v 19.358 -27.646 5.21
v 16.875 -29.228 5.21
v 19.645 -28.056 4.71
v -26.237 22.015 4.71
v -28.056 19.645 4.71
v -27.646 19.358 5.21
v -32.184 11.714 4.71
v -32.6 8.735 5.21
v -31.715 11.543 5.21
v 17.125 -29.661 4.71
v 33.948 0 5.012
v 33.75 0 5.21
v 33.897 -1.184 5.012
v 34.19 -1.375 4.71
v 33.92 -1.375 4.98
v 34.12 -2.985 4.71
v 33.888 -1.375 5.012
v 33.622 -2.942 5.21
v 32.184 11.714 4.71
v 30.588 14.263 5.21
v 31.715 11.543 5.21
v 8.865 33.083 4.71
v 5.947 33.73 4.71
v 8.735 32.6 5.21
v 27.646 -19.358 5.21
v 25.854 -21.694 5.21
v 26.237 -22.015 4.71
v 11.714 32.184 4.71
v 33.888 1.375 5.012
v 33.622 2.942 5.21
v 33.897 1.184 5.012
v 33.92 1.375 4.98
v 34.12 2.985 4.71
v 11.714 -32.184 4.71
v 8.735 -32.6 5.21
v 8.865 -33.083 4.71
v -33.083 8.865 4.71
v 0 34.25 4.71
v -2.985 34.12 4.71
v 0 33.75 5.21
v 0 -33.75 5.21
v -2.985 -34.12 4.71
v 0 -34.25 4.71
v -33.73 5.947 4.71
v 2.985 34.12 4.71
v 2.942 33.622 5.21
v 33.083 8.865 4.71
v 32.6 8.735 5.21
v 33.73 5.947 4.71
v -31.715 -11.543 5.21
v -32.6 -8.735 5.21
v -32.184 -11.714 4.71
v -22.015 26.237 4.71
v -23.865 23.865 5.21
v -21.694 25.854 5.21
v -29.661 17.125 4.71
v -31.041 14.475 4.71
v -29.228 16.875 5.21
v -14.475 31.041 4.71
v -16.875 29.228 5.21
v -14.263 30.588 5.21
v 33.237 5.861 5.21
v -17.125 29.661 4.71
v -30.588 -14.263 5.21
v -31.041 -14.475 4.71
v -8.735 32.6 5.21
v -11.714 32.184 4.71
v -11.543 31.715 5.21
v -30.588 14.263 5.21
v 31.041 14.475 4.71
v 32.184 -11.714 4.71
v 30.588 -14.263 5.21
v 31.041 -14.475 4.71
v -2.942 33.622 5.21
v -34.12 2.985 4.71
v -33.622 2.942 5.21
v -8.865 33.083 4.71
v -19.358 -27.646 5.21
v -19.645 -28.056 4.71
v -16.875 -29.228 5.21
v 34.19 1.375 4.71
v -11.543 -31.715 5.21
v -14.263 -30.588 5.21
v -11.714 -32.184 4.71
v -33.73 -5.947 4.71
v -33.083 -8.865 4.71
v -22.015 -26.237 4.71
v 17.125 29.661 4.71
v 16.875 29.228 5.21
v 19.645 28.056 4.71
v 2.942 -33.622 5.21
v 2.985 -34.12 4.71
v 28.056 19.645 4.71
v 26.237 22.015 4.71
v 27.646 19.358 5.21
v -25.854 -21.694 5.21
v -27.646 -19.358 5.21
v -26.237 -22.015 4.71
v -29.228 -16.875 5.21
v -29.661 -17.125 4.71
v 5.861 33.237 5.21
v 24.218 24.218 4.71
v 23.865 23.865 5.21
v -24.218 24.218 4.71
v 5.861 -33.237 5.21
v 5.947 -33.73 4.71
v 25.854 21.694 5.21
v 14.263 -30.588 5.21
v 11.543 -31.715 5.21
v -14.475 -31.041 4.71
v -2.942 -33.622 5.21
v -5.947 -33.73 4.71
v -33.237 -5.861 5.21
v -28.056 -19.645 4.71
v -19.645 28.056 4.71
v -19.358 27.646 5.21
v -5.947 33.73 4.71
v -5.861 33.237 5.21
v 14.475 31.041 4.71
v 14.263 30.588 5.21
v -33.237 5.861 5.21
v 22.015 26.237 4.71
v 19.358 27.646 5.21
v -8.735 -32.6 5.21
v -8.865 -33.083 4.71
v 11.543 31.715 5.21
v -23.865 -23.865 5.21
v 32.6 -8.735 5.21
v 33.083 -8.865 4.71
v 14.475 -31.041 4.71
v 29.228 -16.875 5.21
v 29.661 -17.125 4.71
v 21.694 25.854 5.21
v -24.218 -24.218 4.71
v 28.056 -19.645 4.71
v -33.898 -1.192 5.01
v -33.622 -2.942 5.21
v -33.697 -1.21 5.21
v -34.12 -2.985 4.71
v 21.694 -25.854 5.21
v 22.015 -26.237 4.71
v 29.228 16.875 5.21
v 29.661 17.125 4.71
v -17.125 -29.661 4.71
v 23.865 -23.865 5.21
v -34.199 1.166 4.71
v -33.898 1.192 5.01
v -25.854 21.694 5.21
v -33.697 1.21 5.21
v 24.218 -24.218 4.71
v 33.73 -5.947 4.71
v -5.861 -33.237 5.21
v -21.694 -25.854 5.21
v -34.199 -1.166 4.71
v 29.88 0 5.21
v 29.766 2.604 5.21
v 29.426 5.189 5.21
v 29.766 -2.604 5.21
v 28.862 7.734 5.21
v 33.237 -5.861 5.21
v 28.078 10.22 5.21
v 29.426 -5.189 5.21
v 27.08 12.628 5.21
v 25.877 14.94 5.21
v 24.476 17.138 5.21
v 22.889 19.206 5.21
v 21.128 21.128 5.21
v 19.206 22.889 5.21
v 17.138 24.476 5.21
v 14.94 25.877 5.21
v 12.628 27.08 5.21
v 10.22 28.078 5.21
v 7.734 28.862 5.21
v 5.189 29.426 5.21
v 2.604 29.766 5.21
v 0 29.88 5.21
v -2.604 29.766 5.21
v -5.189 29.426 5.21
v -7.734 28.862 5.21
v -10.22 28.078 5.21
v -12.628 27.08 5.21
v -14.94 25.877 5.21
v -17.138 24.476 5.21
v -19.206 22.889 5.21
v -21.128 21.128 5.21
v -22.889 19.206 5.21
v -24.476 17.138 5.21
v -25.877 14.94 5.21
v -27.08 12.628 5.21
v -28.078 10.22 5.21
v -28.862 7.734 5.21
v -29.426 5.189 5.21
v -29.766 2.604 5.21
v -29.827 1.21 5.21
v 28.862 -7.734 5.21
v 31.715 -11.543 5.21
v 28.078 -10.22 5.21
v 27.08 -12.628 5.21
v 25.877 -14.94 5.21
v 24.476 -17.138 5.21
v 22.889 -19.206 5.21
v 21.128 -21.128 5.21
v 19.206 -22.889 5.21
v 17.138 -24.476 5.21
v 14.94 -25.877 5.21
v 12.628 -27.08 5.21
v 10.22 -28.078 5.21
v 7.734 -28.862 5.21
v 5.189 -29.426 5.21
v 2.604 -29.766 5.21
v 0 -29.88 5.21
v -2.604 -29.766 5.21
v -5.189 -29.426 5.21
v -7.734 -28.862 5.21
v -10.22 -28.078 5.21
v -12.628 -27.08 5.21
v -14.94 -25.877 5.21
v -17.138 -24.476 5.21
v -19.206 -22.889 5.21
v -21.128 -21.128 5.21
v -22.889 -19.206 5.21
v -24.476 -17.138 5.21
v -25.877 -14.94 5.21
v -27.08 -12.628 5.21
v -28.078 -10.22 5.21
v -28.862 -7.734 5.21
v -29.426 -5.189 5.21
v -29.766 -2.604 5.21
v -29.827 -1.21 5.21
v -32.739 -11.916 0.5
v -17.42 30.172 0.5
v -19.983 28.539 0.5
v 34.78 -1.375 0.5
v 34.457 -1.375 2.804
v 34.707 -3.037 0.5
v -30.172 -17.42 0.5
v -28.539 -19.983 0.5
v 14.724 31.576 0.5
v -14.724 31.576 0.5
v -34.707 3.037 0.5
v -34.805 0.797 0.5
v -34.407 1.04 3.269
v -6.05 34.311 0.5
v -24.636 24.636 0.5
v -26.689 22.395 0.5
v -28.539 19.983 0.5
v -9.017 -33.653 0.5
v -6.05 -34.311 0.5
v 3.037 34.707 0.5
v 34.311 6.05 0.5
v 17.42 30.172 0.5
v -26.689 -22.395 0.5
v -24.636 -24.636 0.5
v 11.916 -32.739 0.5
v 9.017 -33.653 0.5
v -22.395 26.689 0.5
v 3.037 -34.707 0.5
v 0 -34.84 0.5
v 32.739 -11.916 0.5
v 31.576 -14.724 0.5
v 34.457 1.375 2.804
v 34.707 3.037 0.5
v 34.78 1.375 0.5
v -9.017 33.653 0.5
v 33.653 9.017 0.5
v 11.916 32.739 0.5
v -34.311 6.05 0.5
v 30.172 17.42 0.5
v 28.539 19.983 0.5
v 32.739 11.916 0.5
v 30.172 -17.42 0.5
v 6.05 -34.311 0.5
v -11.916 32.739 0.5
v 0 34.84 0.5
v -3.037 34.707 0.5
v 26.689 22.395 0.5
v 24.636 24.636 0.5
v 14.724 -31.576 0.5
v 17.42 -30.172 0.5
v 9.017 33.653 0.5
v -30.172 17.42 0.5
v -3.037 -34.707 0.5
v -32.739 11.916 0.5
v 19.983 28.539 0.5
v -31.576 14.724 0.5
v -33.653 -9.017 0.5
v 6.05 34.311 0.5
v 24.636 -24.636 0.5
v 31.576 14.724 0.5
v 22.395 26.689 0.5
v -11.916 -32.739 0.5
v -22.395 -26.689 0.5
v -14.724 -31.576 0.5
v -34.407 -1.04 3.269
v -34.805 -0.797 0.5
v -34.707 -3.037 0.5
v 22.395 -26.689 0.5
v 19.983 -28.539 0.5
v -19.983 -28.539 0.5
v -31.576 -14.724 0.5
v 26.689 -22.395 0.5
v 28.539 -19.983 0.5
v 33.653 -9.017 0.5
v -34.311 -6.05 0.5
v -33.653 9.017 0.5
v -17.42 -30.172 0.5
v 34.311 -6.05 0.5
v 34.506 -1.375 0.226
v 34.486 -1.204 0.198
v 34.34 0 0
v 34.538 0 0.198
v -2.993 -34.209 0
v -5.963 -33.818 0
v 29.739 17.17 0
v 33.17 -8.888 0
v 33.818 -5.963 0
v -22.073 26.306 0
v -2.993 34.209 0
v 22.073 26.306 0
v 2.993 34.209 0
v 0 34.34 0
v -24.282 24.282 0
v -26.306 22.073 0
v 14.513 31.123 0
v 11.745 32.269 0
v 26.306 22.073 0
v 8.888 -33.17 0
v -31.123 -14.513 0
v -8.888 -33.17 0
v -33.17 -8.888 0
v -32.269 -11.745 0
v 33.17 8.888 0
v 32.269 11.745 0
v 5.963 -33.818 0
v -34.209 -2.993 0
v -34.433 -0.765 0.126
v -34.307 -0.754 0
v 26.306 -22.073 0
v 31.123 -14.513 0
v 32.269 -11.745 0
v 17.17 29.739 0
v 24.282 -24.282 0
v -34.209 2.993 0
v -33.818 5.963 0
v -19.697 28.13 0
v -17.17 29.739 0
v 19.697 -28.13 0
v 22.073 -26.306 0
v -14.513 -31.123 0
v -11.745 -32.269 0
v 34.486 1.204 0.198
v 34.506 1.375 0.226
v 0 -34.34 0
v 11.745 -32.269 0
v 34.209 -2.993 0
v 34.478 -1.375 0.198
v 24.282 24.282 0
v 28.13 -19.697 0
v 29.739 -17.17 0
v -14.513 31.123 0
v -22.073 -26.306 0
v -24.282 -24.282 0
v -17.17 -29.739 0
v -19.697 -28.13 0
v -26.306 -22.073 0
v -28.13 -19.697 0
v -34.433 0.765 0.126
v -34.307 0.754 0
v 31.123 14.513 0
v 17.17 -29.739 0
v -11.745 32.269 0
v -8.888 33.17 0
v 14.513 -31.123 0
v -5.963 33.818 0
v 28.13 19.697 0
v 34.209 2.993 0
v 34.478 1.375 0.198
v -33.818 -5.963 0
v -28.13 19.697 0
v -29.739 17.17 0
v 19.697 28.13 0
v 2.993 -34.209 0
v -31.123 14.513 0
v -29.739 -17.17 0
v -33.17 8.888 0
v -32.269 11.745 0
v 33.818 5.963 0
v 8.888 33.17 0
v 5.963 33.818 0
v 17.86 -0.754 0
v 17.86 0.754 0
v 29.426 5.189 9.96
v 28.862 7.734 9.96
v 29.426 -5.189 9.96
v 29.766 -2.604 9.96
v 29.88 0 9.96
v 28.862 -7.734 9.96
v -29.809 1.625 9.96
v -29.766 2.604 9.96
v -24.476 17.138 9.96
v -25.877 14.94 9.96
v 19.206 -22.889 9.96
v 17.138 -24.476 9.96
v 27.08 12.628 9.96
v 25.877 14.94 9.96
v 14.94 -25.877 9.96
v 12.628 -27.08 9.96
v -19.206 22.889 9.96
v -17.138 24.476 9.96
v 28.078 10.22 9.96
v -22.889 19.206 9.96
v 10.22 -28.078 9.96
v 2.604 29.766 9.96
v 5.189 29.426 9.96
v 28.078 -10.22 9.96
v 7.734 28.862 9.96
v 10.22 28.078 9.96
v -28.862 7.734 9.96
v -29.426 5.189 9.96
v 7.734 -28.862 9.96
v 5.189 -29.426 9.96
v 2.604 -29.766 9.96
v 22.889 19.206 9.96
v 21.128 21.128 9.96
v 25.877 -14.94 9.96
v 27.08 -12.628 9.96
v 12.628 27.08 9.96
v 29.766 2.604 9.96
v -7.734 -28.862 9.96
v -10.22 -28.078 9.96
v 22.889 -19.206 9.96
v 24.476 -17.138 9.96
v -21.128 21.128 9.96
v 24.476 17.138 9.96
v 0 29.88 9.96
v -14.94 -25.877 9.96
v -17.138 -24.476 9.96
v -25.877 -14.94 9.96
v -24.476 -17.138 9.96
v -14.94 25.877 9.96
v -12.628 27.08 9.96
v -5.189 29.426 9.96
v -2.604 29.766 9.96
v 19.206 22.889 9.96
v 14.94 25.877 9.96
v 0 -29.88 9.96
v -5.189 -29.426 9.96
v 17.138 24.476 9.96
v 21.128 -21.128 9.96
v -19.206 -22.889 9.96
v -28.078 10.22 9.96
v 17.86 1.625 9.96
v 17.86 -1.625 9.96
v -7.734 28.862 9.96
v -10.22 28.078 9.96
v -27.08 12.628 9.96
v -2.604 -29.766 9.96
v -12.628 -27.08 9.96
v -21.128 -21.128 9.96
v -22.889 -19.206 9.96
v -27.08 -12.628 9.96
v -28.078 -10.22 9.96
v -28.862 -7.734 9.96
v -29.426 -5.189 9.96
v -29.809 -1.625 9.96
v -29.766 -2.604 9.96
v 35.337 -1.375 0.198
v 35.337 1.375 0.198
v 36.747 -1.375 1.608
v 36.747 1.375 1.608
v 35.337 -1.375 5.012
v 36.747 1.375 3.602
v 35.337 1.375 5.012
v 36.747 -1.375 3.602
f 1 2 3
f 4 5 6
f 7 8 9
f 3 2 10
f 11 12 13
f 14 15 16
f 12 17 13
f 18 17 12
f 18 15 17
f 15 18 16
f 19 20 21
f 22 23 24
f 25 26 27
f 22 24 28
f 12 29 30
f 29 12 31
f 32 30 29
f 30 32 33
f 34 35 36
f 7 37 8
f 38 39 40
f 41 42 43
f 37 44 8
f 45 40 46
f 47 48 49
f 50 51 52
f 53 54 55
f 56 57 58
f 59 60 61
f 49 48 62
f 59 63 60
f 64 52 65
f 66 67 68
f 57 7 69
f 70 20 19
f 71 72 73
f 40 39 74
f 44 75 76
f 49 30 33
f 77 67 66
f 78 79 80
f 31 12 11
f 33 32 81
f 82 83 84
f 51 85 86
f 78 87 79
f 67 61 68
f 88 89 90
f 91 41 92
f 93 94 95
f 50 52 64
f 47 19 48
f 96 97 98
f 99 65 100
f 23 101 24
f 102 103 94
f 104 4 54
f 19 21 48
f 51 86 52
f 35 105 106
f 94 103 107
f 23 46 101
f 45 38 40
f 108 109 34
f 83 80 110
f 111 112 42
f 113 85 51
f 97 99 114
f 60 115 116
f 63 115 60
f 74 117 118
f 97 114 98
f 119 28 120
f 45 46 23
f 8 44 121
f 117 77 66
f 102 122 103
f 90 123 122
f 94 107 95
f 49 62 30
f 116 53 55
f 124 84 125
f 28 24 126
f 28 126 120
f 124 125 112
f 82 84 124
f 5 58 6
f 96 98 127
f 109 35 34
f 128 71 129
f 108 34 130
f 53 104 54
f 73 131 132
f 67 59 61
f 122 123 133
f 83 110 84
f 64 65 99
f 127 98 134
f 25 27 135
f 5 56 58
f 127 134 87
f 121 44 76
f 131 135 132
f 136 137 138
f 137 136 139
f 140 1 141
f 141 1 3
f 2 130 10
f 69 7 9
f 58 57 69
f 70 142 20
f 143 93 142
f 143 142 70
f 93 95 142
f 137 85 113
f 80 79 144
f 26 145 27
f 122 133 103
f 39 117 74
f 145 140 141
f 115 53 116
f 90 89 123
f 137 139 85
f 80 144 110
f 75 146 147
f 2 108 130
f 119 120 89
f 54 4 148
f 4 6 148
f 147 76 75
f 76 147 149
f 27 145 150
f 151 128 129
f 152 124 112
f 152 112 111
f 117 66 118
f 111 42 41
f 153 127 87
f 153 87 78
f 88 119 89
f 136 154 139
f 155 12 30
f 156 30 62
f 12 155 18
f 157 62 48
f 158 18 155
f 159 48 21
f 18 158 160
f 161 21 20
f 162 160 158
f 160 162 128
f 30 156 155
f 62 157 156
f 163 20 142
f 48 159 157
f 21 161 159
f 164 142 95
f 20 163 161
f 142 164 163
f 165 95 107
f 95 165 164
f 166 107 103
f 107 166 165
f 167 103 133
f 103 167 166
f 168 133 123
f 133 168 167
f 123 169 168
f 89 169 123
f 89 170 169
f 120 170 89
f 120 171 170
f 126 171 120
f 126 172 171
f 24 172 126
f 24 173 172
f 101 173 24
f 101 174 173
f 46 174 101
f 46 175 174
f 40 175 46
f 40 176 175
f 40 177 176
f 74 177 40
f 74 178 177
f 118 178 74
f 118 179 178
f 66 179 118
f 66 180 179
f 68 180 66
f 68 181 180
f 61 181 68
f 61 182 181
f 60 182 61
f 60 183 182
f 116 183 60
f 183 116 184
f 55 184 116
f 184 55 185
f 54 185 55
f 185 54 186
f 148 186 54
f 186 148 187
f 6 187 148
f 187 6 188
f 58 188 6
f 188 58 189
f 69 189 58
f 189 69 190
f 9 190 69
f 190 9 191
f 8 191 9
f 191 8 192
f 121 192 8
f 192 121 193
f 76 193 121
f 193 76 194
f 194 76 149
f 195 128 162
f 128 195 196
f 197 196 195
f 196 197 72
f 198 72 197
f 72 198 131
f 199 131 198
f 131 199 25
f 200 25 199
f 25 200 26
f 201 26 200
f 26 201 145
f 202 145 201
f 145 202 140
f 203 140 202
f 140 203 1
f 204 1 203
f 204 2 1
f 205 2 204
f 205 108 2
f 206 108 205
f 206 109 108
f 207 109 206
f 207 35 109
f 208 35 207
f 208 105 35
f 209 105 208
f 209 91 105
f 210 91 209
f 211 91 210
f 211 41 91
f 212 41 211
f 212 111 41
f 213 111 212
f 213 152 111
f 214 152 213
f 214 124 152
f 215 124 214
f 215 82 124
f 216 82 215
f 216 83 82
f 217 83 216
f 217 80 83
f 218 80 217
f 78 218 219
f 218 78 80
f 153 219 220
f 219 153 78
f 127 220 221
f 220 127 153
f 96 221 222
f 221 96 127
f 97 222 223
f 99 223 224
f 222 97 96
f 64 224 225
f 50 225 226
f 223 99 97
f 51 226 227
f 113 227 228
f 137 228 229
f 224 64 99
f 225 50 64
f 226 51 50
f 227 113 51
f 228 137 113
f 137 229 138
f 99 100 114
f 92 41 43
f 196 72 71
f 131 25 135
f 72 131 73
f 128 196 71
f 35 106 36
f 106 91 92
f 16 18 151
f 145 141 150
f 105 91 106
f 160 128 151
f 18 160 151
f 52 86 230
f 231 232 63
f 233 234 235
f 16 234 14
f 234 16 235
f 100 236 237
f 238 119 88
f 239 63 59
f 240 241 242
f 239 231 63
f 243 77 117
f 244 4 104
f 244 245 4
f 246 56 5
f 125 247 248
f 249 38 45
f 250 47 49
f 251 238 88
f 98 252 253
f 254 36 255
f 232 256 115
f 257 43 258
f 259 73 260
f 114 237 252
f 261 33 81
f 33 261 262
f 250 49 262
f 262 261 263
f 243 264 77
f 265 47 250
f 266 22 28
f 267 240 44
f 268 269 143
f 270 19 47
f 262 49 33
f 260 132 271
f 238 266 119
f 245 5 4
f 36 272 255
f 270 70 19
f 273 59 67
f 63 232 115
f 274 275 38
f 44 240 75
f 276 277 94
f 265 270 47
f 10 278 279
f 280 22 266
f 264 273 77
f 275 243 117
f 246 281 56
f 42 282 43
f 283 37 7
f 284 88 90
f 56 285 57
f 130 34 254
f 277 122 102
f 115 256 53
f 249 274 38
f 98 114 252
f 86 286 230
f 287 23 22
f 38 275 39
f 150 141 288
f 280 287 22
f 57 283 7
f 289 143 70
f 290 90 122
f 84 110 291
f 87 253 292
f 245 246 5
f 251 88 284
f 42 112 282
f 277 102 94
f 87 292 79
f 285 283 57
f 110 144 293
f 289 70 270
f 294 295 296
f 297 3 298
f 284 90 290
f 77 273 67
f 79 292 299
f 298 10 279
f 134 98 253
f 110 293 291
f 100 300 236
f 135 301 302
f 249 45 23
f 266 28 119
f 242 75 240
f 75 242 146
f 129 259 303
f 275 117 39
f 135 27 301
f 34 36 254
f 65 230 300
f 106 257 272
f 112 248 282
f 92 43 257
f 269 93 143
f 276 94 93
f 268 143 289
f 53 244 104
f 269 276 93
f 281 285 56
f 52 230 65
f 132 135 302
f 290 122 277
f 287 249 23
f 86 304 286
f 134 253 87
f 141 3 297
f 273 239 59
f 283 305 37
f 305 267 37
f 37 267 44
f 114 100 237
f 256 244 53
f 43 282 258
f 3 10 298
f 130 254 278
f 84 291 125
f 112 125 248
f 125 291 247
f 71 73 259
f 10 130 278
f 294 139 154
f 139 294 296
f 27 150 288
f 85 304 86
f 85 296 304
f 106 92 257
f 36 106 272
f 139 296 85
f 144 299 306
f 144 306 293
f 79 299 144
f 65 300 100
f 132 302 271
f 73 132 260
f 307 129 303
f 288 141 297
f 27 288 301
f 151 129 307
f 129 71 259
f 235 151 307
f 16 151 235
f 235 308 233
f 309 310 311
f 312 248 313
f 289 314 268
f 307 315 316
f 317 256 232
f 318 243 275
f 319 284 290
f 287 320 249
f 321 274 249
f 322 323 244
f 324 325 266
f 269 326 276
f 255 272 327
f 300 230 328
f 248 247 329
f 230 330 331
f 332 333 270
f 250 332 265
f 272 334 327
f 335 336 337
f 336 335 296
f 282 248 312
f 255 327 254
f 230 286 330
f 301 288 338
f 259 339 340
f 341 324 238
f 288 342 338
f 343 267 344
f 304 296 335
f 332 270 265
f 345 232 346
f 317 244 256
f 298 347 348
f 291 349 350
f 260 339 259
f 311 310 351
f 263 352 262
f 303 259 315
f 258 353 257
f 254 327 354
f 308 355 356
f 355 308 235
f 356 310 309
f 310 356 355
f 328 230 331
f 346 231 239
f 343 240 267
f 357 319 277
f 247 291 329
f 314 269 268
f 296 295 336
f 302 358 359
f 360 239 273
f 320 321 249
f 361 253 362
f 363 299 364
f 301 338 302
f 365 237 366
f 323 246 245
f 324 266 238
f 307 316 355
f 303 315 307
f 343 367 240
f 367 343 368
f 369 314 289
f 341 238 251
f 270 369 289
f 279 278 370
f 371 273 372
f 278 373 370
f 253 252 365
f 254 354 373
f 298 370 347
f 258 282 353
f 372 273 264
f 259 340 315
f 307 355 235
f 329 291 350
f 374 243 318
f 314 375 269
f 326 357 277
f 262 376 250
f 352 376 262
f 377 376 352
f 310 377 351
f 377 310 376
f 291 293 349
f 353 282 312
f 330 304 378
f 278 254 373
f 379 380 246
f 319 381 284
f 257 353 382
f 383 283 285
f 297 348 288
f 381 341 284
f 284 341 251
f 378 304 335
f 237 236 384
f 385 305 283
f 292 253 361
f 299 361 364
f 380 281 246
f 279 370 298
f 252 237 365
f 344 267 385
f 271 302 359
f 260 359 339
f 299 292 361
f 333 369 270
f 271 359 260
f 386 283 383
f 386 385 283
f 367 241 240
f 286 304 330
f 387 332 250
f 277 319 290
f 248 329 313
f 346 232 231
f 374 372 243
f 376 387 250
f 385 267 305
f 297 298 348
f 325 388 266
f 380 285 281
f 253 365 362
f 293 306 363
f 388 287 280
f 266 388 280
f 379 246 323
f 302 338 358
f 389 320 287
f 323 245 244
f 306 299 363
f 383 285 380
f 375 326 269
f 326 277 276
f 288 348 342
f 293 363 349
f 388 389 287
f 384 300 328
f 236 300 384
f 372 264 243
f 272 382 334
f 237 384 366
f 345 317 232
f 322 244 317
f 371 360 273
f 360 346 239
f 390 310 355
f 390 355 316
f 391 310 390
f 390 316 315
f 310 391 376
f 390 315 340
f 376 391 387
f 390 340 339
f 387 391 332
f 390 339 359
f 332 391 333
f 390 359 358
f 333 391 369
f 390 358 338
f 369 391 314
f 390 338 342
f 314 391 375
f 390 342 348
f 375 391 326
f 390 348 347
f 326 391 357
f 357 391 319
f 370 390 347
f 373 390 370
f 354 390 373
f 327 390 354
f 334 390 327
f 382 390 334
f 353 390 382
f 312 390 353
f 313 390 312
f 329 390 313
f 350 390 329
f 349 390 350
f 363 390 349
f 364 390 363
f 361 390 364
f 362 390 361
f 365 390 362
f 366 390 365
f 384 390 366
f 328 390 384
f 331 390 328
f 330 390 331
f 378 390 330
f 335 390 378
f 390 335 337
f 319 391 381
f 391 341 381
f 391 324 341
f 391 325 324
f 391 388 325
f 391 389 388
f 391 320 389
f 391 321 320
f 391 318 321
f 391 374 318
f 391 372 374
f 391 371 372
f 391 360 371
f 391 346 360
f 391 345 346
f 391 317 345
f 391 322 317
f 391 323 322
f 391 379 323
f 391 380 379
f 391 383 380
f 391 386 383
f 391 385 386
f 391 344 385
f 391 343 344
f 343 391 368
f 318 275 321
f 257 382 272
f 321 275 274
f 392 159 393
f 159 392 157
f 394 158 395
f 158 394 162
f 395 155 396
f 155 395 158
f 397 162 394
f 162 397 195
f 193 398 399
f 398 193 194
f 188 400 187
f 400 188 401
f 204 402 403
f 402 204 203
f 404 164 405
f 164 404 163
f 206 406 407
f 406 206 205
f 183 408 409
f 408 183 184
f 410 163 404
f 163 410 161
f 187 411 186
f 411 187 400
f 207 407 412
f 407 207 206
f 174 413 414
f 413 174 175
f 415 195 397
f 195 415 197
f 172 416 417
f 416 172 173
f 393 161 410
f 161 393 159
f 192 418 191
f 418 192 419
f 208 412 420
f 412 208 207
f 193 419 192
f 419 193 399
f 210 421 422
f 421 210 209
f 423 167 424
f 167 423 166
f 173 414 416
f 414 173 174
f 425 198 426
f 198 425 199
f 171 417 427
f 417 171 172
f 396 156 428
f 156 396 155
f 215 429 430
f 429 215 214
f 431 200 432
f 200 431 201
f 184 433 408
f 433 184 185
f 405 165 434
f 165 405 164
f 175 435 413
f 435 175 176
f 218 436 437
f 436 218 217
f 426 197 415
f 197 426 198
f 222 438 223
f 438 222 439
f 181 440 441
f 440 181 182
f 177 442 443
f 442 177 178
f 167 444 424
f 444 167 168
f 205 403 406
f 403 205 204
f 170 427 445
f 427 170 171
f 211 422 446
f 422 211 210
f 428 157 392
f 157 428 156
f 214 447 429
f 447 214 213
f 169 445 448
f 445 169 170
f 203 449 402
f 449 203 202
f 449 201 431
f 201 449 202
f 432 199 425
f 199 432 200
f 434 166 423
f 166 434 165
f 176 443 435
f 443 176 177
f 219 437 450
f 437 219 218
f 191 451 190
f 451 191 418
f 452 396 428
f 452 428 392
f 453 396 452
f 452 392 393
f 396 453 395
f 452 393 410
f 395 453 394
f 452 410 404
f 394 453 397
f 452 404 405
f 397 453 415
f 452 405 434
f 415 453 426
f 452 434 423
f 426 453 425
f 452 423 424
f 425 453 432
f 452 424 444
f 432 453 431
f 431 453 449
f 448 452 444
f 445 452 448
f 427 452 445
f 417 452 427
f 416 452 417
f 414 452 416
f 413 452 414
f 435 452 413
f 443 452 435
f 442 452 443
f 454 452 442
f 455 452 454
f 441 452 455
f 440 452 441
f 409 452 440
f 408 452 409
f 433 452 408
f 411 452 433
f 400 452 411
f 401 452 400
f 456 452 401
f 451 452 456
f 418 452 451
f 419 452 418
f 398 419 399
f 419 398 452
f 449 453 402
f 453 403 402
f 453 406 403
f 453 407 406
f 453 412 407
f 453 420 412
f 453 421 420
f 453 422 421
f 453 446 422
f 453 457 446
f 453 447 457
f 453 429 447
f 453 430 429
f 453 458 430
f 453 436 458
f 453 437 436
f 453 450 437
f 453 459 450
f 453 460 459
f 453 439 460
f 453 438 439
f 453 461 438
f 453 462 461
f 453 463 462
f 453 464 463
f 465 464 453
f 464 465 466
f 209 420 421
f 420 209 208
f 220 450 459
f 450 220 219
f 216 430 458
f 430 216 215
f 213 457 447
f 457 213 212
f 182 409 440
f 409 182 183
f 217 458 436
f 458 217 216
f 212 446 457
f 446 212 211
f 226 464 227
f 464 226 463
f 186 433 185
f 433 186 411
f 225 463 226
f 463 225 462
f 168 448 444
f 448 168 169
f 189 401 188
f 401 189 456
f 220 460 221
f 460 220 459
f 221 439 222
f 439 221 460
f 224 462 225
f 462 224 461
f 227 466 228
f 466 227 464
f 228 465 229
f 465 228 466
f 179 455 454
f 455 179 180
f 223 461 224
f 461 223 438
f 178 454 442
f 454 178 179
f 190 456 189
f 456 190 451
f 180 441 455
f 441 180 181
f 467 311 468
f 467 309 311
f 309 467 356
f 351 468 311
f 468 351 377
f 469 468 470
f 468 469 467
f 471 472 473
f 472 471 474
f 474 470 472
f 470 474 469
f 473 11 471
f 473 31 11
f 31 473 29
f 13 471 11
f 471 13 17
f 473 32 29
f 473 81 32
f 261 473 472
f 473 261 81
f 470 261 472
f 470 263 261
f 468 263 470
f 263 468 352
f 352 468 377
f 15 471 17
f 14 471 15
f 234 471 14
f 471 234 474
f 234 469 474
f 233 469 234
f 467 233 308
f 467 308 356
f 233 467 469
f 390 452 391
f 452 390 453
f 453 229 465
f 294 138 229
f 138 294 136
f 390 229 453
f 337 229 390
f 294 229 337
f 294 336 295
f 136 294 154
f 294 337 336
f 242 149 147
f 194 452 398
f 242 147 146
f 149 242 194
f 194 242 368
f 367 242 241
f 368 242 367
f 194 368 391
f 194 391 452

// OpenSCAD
// A tool for creating custom saw inserts
//
// Lisenced under creative commons, attribution, share-alike
// For the attribution requirement, please provide a link to:
//	http://www.thingiverse.com/thing:1024418

// the units that all of the measurements below will be in
units=0; // [0:mm,1:inch]

// how big around the top of the insert is
top_d=69.68;

// how big around the top of the insert is (if zero, uses top_d)
bottom_d=68.5;

// size of a chamfer for the top (can be zero)
top_chamfer=0.5;

// size of a chamfer for the bottom (can be zero)
bottom_chamfer=0.5;

// the width of the blade slot (can be zero for no kerf)
kerf_width=1.5;

// how long to make the slot for the blade (can be zero for no kerf)
kerf_len=52.7;

// EXPERIMENTAL: tilt the kerf on each side so that dust falls out easier
kerf_crud_drainage=1; //[0:off,1:try it]

// how thick the insert is
thickness=5.21;

// how wide to make a key (fits into blade installation slot to keep insert from turning)  Can be zero.
key_width=2.75;

// What angle you want the key to be at
key_orientation=0; //[0,45,90,135,180,225,270,315]

// Add sub-support to drop even deeper (zero = no sub support)
sub_dia=59.76;

// Add sub-support to drop even deeper (zero = no sub support)
sub_thickness=4.75;

// flip upside-down for easier printing
print_orientation=1; // [0:view,1:print]

/* [hidden] */

units_table=[1,25.4];

function tomm(x)=x*units_table[units];

module doTheThing(){
	top_d=tomm(top_d);
	bottom_d=bottom_d<=0?top_d:tomm(bottom_d);
	top_chamfer=top_chamfer<=0?0.001:tomm(top_chamfer);
	bottom_chamfer=bottom_chamfer<=0?0.001:tomm(bottom_chamfer);
	kerf_width=tomm(kerf_width);
	kerf_len=tomm(kerf_len);
	thickness=tomm(thickness);
	key_width=tomm(key_width);
	sub_dia=tomm(sub_dia);
	sub_thickness=sub_dia<=0?0:tomm(sub_thickness);
	cd_angle=10;
	translate([0,0,print_orientation==1?thickness+sub_thickness:0]) rotate([print_orientation==1?180:0,0,0]) difference(){
		union(){
			// blank
			translate([0,0,sub_thickness]) cylinder(r1=bottom_d/2-bottom_chamfer,r2=bottom_d/2,h=bottom_chamfer,$fn=72);
			translate([0,0,sub_thickness+bottom_chamfer]) cylinder(r1=bottom_d/2,r2=top_d/2,h=thickness-bottom_chamfer-top_chamfer,$fn=72);
			translate([0,0,sub_thickness+thickness-bottom_chamfer]) cylinder(r1=top_d/2,r2=top_d/2-top_chamfer,h=top_chamfer,$fn=72);
			if(sub_thickness>0){
				cylinder(r=sub_dia/2,h=sub_thickness,$fn=72);
			}
			//key
			if(key_width>0){
				rotate([0,0,key_orientation]) translate([top_d/2-top_chamfer,key_width/2,thickness/2+sub_thickness]) rotate([90,0,0]) rotate([0,0,180/8]) cylinder(r=thickness/2,h=key_width,$fn=8);
			}
		}
		//kerf
		if(kerf_width>0&&kerf_len>0){
			if(kerf_crud_drainage==0){
				translate([-top_d/2-thickness,-kerf_width/2,-thickness/2]) cube([kerf_len+thickness,kerf_width,thickness*2+sub_thickness]);
			}else translate([-top_d/2-thickness,0,thickness+sub_thickness+0.01]) hull(){
				rotate([cd_angle/2,0,0]) translate([0,-kerf_width/2,-thickness*2-sub_thickness]) cube([kerf_len+thickness,kerf_width,thickness*2+sub_thickness]);
				rotate([-cd_angle/2,0,0]) translate([0,-kerf_width/2,-thickness*2-sub_thickness]) cube([kerf_len+thickness,kerf_width,thickness*2+sub_thickness]);
			}
		}
	}
}

doTheThing();
